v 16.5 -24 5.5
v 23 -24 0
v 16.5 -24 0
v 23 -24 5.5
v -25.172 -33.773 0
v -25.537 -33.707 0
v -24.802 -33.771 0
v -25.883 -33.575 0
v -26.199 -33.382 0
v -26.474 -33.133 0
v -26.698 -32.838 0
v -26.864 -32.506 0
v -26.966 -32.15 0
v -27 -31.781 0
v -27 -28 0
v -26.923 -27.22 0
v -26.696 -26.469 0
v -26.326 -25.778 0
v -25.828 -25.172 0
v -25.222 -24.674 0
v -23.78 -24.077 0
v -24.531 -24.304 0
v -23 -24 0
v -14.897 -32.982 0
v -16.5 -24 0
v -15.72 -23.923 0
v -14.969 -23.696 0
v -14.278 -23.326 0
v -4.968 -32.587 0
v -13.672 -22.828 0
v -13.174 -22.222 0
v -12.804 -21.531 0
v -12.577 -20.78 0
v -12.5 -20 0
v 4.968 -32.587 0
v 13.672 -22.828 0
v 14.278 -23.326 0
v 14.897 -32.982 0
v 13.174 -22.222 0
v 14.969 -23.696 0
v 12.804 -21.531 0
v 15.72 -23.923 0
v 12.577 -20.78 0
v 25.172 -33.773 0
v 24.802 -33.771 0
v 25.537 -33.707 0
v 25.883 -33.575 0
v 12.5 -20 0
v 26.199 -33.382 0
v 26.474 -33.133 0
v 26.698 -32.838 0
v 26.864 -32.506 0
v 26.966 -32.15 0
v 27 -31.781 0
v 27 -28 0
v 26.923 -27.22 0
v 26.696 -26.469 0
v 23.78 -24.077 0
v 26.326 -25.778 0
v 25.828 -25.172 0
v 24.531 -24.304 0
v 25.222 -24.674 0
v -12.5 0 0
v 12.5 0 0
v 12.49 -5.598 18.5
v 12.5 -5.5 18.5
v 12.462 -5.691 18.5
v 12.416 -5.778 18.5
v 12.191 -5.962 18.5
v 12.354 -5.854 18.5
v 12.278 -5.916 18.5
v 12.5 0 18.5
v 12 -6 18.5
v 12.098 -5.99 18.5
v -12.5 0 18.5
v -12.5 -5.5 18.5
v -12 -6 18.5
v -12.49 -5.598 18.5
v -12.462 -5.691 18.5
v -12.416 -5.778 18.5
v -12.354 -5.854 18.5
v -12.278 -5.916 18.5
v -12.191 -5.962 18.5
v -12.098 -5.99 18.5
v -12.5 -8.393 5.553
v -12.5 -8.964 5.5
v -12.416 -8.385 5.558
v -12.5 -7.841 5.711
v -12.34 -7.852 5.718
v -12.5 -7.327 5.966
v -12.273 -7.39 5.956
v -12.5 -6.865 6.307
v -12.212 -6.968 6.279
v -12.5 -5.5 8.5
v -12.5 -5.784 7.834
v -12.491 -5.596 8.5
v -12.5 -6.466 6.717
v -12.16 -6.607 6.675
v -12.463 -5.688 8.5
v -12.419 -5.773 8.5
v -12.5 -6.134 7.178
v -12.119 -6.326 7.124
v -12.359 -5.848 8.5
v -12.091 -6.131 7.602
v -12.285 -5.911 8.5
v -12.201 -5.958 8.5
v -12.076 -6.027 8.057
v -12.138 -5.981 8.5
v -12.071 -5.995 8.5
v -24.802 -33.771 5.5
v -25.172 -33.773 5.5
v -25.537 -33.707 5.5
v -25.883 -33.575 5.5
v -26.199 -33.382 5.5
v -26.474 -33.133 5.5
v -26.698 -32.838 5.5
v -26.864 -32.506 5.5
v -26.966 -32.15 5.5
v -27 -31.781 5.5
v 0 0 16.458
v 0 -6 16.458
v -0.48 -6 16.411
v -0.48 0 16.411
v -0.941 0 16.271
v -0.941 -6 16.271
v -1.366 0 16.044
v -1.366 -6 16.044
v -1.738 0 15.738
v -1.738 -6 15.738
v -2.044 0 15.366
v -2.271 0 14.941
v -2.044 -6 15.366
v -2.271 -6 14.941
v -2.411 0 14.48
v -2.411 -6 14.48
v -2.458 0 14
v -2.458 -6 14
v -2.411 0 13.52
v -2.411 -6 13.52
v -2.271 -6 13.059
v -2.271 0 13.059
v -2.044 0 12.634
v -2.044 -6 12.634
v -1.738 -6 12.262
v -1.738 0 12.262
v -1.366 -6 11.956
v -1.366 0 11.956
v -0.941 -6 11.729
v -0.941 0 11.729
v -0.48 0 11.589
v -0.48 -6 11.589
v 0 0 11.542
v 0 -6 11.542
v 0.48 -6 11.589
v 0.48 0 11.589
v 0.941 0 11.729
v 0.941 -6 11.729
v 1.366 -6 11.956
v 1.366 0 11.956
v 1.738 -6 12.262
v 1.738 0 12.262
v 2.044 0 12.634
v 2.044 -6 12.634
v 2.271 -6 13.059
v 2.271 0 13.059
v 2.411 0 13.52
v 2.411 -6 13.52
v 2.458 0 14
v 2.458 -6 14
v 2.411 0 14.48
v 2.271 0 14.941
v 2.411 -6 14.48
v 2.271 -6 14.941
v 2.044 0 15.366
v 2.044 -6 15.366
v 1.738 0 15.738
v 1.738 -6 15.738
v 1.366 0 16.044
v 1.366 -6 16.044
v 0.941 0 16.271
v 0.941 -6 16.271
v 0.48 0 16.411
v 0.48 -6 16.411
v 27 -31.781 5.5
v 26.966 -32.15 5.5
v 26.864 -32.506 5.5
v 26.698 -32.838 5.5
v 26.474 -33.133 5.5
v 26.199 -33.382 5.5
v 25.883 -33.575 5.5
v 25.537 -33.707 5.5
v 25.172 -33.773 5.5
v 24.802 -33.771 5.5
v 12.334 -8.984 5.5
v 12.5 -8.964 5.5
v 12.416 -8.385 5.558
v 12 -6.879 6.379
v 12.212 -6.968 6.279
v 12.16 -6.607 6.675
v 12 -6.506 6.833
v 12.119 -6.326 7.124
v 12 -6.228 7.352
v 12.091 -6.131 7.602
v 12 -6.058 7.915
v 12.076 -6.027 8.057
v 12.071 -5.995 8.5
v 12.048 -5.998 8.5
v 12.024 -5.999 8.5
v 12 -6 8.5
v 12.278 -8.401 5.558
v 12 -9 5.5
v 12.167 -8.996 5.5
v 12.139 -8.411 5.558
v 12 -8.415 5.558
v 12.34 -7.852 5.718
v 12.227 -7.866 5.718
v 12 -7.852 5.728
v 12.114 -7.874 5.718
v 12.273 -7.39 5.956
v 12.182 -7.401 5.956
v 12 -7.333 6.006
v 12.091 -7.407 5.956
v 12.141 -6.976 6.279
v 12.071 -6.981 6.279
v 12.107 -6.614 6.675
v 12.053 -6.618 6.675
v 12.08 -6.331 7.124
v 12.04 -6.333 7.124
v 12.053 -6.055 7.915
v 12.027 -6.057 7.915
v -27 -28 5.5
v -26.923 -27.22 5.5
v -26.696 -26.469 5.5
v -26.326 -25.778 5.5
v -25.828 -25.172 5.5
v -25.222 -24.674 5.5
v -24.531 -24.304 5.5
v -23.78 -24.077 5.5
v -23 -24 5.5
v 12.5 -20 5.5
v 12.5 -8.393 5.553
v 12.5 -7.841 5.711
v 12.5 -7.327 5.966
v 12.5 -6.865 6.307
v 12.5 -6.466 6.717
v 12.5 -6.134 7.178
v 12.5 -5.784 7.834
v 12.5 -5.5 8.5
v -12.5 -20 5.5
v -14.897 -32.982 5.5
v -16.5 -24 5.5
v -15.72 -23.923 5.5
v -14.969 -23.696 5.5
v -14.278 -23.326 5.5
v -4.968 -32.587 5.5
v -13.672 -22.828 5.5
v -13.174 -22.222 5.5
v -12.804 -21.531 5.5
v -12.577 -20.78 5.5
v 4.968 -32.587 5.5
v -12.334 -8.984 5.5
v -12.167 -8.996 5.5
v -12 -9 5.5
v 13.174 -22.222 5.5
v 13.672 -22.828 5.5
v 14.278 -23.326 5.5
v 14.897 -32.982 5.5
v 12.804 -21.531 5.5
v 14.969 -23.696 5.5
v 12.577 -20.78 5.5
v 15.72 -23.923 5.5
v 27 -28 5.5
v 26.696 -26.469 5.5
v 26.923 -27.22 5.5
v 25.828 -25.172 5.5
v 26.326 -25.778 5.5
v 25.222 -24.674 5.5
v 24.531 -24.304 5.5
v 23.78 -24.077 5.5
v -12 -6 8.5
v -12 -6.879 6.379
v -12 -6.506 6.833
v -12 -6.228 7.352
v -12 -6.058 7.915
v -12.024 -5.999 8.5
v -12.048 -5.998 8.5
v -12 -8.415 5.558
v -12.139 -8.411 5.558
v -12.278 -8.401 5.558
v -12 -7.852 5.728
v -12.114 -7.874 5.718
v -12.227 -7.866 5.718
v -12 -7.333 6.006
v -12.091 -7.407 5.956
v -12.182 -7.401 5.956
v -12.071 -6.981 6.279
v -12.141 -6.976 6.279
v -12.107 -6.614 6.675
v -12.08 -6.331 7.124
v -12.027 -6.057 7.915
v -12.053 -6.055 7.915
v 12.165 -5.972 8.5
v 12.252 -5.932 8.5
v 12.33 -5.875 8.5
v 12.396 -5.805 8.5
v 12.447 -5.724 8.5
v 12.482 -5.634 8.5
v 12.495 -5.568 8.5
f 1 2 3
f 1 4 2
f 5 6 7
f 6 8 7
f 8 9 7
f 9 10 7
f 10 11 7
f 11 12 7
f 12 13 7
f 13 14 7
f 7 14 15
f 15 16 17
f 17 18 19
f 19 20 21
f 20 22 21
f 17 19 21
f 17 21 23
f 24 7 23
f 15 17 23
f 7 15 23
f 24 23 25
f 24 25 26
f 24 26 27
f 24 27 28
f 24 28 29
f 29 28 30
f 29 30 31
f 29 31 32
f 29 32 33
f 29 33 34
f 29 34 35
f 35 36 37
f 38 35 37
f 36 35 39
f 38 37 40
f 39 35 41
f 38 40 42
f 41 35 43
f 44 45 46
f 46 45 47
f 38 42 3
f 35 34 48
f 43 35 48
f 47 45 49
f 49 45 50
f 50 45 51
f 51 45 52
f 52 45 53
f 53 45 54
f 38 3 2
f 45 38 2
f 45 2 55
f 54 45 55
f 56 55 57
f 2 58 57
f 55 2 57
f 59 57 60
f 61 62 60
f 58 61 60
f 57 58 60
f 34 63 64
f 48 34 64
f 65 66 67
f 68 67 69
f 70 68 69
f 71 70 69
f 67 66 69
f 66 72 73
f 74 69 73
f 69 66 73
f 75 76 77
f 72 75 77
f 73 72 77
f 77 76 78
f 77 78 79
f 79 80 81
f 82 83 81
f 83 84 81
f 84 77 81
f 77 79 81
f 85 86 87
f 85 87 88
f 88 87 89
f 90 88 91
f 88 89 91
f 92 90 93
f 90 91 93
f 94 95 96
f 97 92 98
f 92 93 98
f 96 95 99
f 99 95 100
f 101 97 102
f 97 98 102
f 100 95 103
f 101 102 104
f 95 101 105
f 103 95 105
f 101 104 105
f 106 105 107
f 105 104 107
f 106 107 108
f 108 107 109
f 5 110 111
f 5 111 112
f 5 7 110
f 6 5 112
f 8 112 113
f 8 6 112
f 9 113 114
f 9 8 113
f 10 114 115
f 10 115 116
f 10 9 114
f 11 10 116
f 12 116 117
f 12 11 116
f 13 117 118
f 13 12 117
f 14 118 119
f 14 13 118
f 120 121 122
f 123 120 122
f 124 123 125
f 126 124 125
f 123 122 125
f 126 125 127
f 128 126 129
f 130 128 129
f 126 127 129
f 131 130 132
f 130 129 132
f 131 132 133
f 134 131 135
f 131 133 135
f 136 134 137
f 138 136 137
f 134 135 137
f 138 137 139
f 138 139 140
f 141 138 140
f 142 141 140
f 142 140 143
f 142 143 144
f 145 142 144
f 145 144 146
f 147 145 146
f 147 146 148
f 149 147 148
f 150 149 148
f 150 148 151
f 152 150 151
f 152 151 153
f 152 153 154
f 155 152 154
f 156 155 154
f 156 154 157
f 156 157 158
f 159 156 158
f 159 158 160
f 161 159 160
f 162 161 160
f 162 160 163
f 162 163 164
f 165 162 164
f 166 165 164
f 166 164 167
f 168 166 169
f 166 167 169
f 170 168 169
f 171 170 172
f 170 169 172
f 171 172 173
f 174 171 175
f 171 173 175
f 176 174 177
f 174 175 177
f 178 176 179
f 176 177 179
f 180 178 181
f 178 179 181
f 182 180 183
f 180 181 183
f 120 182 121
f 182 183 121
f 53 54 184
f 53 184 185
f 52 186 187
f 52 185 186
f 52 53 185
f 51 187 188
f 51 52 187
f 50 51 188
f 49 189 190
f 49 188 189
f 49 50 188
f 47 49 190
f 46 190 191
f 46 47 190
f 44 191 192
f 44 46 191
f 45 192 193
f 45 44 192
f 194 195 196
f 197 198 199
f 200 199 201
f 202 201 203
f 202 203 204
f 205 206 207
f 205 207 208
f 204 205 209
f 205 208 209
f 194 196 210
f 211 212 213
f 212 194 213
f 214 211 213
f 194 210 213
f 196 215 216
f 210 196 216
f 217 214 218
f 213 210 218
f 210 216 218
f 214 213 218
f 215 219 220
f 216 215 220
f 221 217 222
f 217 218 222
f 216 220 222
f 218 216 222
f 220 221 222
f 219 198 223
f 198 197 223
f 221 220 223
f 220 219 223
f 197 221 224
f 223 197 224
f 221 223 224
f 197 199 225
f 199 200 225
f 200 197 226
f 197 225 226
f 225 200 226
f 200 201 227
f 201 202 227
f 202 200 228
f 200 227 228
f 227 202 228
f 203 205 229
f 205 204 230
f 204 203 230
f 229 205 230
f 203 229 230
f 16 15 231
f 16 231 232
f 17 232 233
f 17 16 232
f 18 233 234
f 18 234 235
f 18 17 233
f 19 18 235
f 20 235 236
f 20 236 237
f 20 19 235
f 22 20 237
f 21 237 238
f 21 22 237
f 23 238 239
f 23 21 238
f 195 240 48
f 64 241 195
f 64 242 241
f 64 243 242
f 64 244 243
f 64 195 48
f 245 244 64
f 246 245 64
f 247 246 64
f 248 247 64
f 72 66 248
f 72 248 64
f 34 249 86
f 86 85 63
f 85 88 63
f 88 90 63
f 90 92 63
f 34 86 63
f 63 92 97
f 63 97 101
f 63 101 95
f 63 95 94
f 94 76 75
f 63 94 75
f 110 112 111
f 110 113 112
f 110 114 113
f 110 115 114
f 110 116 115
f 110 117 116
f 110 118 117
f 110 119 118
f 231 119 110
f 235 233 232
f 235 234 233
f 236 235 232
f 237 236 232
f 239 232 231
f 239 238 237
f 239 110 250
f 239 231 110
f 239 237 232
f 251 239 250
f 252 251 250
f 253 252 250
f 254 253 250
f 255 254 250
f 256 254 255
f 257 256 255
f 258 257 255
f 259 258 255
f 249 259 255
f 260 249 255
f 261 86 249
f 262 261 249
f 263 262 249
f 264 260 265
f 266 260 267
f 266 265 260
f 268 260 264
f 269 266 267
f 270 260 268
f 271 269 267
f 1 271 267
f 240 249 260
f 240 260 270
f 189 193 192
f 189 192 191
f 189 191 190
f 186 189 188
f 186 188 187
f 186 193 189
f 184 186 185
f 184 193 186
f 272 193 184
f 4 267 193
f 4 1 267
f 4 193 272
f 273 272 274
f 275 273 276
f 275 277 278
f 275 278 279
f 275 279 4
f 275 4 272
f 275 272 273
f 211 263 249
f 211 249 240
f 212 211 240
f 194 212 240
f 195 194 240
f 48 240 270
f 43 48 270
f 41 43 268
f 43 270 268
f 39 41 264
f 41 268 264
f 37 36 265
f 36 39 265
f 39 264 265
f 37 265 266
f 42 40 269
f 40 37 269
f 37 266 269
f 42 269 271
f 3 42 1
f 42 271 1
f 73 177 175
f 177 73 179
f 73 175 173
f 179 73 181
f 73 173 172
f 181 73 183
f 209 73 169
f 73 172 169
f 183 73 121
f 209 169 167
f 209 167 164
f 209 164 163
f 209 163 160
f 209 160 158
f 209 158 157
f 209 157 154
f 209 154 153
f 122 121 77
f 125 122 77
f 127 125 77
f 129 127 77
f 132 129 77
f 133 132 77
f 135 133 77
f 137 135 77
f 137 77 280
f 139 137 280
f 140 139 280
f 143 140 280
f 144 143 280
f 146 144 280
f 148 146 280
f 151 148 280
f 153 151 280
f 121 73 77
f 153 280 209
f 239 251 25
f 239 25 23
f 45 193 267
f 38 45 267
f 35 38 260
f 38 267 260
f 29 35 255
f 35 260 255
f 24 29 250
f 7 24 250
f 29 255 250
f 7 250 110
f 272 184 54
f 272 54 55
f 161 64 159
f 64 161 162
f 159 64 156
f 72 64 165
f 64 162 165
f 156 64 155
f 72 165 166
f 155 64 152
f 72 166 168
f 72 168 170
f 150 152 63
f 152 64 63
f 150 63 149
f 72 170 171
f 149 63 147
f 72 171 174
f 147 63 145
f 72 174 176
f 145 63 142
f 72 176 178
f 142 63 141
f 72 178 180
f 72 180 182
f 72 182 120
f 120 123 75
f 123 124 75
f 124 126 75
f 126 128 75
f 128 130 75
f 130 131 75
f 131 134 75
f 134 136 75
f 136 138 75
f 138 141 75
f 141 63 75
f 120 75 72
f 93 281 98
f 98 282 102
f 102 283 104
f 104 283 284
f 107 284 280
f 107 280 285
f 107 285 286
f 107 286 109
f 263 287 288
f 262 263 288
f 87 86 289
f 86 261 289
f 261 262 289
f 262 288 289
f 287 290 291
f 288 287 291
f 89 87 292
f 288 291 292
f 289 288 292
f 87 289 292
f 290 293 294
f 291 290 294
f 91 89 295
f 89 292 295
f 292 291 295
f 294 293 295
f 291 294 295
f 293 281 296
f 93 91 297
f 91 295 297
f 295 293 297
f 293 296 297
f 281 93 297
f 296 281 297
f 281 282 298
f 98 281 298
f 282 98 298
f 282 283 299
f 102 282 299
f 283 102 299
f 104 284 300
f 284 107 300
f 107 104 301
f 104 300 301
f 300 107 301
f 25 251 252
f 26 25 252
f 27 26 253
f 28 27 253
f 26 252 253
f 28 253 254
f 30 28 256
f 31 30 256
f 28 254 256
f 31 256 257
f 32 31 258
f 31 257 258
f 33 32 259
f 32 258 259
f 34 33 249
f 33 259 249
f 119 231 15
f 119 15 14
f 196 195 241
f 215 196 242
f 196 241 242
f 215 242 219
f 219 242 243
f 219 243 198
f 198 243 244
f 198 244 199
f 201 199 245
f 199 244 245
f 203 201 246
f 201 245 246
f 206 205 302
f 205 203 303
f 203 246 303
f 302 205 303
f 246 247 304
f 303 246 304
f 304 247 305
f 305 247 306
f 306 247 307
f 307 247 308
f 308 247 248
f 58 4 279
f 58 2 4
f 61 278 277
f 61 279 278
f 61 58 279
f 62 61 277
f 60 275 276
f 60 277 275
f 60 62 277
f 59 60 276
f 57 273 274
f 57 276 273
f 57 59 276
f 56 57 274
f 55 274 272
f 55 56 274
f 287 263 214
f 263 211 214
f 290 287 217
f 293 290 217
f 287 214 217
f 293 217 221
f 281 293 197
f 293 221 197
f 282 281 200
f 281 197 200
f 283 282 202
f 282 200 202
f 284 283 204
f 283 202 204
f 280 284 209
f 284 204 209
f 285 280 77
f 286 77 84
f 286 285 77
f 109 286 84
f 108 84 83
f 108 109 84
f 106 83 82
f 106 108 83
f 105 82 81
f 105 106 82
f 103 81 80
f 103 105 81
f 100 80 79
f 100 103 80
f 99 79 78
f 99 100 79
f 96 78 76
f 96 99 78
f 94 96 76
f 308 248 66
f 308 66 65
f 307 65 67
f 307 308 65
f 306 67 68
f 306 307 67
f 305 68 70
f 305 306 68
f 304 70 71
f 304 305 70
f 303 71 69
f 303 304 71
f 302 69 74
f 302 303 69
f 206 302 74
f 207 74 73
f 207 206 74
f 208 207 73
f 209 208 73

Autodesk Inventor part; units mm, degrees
ref_plane "YZ Plane" through (0, 0, 0) normal (1, 0, 0) x (0, 1, 0)
ref_plane "XZ Plane" through (0, 0, 0) normal (0, 1, 0) x (-1, 0, 0)
ref_plane "XY Plane" through (0, 0, 0) normal (0, 0, 1) x (1, 0, 0)
sketch "Skizze1" plane through (0, 0, 0) normal (1, 0, 0) x (0, 1, 0)
  line L0 (0, 18.5) -> (-6, 18.5)
  line L1 (-6, 18.5) -> (-6, 5.5)
  line L2 (-24, 0) -> (0, 0)
  line L3 (0, 0) -> (0, 18.5)
  line L4 (-24, 0) -> (-24, 5.5)
  line L5 (-24, 5.5) -> (-6, 5.5)
  dimension "d0" = 18.5
  dimension "d1" = 6
  dimension "d2" = 5.5
  dimension "d3" = 24
extrude "Extrusion1" add sketch "Skizze1" along normal mid plane 25
sketch "Skizze2" plane through (-12.5, 0, 18.5) normal (0, 1, 0) x (1, 0, 0)
  line L0 (25, 18.5) -> (25, 0) projected
  line L1 (25, 18.5) -> (0, 18.5) projected
  line L2 (0, 0) -> (0, 18.5) projected
  line L3 (0, 0) -> (25, 0) construction
  line L4 (12.5, 0) -> (12.5, 18.5) construction
  line L5 (0, 0) -> (25, 0) projected
  point P0 (12.5, 4.5)
hole "Bohrung1" at (0, 0, 14) direction (0, -1, 0) diameter 4.917 end through all thread size "M6x1" class "6H" standard "ANSI Metric M Profile"
chamfer "Fase1" [suppressed]
fillet "Rundung1" radius 0.5 2 edges at (12.5, -6, 12) (-12.5, -6, 12)
fillet "Rundung2" [suppressed]
sketch "Skizze5" plane through (-12.5, 0, 18.5) normal (0, 1, 0) x (1, 0, 0)
  line L0 (25, 18.5) -> (0, 18.5) projected
  line L1 (0, 0) -> (0, 18.5) projected
  line L2 (25, 18.5) -> (0, 18.5)
  line L3 (0, 18.5) -> (0, 13)
  line L4 (0, 13) -> (25, 13)
  line L5 (25, 13) -> (25, 18.5)
  line L6 (25, 13) -> (25, 18.5) projected
  line L7 (0, 18.5) -> (0, 13) projected
  line L8 (0, 18.5) -> (25, 18.5) projected
  line L9 (0, 13) -> (25, 13) projected
  point P0 (12.5, 18.5)
  point P1 (1, 16.5)
  point P2 (24, 16.5)
sketch "Sketch7" plane through (-12.5, -8, 5.5) normal (0, 0, 1) x (1, 0, 0)
  line L0 (25, 8) -> (0, 8) projected
  line L1 (-14.5, -26) -> (39.5, -26) construction
  line L2 (39.5, -26) -> (39.5, -16)
  line L3 (39.5, -16) -> (-14.5, -16)
  line L4 (-14.5, -16) -> (-14.5, -26)
  line L5 (10.0415, 8) -> (14.9585, 8) construction
  line L6 (12.5, 8) -> (12.5, -16) construction
  arc A0 (39.5, -26) -> (-14.5, -26) centre (12.5, -274.5377) ccw
  dimension "d44" = 54
  dimension "d45" = 10
  dimension "d46" = 24
  dimension "d47" = 250
extrude "Extrusion2" add sketch "Sketch7" against normal up to surface (5.5 mm away) from surface at 0
fillet "Fillet3" radius 2 2 edges at (27, -34, 2.75) (-27, -34, 2.75)
fillet "Fillet3" radius 4 4 edges at (12.5, -24, 2.75) (-12.5, -24, 2.75) (27, -24, 2.75) (-27, -24, 2.75)
fillet "Fillet4" radius 3 1 edges at (0, -6, 5.5)
equation "\"d46\" = d3"
properties part number "Chip Kick Vorne" material "Steel, Carbon"
